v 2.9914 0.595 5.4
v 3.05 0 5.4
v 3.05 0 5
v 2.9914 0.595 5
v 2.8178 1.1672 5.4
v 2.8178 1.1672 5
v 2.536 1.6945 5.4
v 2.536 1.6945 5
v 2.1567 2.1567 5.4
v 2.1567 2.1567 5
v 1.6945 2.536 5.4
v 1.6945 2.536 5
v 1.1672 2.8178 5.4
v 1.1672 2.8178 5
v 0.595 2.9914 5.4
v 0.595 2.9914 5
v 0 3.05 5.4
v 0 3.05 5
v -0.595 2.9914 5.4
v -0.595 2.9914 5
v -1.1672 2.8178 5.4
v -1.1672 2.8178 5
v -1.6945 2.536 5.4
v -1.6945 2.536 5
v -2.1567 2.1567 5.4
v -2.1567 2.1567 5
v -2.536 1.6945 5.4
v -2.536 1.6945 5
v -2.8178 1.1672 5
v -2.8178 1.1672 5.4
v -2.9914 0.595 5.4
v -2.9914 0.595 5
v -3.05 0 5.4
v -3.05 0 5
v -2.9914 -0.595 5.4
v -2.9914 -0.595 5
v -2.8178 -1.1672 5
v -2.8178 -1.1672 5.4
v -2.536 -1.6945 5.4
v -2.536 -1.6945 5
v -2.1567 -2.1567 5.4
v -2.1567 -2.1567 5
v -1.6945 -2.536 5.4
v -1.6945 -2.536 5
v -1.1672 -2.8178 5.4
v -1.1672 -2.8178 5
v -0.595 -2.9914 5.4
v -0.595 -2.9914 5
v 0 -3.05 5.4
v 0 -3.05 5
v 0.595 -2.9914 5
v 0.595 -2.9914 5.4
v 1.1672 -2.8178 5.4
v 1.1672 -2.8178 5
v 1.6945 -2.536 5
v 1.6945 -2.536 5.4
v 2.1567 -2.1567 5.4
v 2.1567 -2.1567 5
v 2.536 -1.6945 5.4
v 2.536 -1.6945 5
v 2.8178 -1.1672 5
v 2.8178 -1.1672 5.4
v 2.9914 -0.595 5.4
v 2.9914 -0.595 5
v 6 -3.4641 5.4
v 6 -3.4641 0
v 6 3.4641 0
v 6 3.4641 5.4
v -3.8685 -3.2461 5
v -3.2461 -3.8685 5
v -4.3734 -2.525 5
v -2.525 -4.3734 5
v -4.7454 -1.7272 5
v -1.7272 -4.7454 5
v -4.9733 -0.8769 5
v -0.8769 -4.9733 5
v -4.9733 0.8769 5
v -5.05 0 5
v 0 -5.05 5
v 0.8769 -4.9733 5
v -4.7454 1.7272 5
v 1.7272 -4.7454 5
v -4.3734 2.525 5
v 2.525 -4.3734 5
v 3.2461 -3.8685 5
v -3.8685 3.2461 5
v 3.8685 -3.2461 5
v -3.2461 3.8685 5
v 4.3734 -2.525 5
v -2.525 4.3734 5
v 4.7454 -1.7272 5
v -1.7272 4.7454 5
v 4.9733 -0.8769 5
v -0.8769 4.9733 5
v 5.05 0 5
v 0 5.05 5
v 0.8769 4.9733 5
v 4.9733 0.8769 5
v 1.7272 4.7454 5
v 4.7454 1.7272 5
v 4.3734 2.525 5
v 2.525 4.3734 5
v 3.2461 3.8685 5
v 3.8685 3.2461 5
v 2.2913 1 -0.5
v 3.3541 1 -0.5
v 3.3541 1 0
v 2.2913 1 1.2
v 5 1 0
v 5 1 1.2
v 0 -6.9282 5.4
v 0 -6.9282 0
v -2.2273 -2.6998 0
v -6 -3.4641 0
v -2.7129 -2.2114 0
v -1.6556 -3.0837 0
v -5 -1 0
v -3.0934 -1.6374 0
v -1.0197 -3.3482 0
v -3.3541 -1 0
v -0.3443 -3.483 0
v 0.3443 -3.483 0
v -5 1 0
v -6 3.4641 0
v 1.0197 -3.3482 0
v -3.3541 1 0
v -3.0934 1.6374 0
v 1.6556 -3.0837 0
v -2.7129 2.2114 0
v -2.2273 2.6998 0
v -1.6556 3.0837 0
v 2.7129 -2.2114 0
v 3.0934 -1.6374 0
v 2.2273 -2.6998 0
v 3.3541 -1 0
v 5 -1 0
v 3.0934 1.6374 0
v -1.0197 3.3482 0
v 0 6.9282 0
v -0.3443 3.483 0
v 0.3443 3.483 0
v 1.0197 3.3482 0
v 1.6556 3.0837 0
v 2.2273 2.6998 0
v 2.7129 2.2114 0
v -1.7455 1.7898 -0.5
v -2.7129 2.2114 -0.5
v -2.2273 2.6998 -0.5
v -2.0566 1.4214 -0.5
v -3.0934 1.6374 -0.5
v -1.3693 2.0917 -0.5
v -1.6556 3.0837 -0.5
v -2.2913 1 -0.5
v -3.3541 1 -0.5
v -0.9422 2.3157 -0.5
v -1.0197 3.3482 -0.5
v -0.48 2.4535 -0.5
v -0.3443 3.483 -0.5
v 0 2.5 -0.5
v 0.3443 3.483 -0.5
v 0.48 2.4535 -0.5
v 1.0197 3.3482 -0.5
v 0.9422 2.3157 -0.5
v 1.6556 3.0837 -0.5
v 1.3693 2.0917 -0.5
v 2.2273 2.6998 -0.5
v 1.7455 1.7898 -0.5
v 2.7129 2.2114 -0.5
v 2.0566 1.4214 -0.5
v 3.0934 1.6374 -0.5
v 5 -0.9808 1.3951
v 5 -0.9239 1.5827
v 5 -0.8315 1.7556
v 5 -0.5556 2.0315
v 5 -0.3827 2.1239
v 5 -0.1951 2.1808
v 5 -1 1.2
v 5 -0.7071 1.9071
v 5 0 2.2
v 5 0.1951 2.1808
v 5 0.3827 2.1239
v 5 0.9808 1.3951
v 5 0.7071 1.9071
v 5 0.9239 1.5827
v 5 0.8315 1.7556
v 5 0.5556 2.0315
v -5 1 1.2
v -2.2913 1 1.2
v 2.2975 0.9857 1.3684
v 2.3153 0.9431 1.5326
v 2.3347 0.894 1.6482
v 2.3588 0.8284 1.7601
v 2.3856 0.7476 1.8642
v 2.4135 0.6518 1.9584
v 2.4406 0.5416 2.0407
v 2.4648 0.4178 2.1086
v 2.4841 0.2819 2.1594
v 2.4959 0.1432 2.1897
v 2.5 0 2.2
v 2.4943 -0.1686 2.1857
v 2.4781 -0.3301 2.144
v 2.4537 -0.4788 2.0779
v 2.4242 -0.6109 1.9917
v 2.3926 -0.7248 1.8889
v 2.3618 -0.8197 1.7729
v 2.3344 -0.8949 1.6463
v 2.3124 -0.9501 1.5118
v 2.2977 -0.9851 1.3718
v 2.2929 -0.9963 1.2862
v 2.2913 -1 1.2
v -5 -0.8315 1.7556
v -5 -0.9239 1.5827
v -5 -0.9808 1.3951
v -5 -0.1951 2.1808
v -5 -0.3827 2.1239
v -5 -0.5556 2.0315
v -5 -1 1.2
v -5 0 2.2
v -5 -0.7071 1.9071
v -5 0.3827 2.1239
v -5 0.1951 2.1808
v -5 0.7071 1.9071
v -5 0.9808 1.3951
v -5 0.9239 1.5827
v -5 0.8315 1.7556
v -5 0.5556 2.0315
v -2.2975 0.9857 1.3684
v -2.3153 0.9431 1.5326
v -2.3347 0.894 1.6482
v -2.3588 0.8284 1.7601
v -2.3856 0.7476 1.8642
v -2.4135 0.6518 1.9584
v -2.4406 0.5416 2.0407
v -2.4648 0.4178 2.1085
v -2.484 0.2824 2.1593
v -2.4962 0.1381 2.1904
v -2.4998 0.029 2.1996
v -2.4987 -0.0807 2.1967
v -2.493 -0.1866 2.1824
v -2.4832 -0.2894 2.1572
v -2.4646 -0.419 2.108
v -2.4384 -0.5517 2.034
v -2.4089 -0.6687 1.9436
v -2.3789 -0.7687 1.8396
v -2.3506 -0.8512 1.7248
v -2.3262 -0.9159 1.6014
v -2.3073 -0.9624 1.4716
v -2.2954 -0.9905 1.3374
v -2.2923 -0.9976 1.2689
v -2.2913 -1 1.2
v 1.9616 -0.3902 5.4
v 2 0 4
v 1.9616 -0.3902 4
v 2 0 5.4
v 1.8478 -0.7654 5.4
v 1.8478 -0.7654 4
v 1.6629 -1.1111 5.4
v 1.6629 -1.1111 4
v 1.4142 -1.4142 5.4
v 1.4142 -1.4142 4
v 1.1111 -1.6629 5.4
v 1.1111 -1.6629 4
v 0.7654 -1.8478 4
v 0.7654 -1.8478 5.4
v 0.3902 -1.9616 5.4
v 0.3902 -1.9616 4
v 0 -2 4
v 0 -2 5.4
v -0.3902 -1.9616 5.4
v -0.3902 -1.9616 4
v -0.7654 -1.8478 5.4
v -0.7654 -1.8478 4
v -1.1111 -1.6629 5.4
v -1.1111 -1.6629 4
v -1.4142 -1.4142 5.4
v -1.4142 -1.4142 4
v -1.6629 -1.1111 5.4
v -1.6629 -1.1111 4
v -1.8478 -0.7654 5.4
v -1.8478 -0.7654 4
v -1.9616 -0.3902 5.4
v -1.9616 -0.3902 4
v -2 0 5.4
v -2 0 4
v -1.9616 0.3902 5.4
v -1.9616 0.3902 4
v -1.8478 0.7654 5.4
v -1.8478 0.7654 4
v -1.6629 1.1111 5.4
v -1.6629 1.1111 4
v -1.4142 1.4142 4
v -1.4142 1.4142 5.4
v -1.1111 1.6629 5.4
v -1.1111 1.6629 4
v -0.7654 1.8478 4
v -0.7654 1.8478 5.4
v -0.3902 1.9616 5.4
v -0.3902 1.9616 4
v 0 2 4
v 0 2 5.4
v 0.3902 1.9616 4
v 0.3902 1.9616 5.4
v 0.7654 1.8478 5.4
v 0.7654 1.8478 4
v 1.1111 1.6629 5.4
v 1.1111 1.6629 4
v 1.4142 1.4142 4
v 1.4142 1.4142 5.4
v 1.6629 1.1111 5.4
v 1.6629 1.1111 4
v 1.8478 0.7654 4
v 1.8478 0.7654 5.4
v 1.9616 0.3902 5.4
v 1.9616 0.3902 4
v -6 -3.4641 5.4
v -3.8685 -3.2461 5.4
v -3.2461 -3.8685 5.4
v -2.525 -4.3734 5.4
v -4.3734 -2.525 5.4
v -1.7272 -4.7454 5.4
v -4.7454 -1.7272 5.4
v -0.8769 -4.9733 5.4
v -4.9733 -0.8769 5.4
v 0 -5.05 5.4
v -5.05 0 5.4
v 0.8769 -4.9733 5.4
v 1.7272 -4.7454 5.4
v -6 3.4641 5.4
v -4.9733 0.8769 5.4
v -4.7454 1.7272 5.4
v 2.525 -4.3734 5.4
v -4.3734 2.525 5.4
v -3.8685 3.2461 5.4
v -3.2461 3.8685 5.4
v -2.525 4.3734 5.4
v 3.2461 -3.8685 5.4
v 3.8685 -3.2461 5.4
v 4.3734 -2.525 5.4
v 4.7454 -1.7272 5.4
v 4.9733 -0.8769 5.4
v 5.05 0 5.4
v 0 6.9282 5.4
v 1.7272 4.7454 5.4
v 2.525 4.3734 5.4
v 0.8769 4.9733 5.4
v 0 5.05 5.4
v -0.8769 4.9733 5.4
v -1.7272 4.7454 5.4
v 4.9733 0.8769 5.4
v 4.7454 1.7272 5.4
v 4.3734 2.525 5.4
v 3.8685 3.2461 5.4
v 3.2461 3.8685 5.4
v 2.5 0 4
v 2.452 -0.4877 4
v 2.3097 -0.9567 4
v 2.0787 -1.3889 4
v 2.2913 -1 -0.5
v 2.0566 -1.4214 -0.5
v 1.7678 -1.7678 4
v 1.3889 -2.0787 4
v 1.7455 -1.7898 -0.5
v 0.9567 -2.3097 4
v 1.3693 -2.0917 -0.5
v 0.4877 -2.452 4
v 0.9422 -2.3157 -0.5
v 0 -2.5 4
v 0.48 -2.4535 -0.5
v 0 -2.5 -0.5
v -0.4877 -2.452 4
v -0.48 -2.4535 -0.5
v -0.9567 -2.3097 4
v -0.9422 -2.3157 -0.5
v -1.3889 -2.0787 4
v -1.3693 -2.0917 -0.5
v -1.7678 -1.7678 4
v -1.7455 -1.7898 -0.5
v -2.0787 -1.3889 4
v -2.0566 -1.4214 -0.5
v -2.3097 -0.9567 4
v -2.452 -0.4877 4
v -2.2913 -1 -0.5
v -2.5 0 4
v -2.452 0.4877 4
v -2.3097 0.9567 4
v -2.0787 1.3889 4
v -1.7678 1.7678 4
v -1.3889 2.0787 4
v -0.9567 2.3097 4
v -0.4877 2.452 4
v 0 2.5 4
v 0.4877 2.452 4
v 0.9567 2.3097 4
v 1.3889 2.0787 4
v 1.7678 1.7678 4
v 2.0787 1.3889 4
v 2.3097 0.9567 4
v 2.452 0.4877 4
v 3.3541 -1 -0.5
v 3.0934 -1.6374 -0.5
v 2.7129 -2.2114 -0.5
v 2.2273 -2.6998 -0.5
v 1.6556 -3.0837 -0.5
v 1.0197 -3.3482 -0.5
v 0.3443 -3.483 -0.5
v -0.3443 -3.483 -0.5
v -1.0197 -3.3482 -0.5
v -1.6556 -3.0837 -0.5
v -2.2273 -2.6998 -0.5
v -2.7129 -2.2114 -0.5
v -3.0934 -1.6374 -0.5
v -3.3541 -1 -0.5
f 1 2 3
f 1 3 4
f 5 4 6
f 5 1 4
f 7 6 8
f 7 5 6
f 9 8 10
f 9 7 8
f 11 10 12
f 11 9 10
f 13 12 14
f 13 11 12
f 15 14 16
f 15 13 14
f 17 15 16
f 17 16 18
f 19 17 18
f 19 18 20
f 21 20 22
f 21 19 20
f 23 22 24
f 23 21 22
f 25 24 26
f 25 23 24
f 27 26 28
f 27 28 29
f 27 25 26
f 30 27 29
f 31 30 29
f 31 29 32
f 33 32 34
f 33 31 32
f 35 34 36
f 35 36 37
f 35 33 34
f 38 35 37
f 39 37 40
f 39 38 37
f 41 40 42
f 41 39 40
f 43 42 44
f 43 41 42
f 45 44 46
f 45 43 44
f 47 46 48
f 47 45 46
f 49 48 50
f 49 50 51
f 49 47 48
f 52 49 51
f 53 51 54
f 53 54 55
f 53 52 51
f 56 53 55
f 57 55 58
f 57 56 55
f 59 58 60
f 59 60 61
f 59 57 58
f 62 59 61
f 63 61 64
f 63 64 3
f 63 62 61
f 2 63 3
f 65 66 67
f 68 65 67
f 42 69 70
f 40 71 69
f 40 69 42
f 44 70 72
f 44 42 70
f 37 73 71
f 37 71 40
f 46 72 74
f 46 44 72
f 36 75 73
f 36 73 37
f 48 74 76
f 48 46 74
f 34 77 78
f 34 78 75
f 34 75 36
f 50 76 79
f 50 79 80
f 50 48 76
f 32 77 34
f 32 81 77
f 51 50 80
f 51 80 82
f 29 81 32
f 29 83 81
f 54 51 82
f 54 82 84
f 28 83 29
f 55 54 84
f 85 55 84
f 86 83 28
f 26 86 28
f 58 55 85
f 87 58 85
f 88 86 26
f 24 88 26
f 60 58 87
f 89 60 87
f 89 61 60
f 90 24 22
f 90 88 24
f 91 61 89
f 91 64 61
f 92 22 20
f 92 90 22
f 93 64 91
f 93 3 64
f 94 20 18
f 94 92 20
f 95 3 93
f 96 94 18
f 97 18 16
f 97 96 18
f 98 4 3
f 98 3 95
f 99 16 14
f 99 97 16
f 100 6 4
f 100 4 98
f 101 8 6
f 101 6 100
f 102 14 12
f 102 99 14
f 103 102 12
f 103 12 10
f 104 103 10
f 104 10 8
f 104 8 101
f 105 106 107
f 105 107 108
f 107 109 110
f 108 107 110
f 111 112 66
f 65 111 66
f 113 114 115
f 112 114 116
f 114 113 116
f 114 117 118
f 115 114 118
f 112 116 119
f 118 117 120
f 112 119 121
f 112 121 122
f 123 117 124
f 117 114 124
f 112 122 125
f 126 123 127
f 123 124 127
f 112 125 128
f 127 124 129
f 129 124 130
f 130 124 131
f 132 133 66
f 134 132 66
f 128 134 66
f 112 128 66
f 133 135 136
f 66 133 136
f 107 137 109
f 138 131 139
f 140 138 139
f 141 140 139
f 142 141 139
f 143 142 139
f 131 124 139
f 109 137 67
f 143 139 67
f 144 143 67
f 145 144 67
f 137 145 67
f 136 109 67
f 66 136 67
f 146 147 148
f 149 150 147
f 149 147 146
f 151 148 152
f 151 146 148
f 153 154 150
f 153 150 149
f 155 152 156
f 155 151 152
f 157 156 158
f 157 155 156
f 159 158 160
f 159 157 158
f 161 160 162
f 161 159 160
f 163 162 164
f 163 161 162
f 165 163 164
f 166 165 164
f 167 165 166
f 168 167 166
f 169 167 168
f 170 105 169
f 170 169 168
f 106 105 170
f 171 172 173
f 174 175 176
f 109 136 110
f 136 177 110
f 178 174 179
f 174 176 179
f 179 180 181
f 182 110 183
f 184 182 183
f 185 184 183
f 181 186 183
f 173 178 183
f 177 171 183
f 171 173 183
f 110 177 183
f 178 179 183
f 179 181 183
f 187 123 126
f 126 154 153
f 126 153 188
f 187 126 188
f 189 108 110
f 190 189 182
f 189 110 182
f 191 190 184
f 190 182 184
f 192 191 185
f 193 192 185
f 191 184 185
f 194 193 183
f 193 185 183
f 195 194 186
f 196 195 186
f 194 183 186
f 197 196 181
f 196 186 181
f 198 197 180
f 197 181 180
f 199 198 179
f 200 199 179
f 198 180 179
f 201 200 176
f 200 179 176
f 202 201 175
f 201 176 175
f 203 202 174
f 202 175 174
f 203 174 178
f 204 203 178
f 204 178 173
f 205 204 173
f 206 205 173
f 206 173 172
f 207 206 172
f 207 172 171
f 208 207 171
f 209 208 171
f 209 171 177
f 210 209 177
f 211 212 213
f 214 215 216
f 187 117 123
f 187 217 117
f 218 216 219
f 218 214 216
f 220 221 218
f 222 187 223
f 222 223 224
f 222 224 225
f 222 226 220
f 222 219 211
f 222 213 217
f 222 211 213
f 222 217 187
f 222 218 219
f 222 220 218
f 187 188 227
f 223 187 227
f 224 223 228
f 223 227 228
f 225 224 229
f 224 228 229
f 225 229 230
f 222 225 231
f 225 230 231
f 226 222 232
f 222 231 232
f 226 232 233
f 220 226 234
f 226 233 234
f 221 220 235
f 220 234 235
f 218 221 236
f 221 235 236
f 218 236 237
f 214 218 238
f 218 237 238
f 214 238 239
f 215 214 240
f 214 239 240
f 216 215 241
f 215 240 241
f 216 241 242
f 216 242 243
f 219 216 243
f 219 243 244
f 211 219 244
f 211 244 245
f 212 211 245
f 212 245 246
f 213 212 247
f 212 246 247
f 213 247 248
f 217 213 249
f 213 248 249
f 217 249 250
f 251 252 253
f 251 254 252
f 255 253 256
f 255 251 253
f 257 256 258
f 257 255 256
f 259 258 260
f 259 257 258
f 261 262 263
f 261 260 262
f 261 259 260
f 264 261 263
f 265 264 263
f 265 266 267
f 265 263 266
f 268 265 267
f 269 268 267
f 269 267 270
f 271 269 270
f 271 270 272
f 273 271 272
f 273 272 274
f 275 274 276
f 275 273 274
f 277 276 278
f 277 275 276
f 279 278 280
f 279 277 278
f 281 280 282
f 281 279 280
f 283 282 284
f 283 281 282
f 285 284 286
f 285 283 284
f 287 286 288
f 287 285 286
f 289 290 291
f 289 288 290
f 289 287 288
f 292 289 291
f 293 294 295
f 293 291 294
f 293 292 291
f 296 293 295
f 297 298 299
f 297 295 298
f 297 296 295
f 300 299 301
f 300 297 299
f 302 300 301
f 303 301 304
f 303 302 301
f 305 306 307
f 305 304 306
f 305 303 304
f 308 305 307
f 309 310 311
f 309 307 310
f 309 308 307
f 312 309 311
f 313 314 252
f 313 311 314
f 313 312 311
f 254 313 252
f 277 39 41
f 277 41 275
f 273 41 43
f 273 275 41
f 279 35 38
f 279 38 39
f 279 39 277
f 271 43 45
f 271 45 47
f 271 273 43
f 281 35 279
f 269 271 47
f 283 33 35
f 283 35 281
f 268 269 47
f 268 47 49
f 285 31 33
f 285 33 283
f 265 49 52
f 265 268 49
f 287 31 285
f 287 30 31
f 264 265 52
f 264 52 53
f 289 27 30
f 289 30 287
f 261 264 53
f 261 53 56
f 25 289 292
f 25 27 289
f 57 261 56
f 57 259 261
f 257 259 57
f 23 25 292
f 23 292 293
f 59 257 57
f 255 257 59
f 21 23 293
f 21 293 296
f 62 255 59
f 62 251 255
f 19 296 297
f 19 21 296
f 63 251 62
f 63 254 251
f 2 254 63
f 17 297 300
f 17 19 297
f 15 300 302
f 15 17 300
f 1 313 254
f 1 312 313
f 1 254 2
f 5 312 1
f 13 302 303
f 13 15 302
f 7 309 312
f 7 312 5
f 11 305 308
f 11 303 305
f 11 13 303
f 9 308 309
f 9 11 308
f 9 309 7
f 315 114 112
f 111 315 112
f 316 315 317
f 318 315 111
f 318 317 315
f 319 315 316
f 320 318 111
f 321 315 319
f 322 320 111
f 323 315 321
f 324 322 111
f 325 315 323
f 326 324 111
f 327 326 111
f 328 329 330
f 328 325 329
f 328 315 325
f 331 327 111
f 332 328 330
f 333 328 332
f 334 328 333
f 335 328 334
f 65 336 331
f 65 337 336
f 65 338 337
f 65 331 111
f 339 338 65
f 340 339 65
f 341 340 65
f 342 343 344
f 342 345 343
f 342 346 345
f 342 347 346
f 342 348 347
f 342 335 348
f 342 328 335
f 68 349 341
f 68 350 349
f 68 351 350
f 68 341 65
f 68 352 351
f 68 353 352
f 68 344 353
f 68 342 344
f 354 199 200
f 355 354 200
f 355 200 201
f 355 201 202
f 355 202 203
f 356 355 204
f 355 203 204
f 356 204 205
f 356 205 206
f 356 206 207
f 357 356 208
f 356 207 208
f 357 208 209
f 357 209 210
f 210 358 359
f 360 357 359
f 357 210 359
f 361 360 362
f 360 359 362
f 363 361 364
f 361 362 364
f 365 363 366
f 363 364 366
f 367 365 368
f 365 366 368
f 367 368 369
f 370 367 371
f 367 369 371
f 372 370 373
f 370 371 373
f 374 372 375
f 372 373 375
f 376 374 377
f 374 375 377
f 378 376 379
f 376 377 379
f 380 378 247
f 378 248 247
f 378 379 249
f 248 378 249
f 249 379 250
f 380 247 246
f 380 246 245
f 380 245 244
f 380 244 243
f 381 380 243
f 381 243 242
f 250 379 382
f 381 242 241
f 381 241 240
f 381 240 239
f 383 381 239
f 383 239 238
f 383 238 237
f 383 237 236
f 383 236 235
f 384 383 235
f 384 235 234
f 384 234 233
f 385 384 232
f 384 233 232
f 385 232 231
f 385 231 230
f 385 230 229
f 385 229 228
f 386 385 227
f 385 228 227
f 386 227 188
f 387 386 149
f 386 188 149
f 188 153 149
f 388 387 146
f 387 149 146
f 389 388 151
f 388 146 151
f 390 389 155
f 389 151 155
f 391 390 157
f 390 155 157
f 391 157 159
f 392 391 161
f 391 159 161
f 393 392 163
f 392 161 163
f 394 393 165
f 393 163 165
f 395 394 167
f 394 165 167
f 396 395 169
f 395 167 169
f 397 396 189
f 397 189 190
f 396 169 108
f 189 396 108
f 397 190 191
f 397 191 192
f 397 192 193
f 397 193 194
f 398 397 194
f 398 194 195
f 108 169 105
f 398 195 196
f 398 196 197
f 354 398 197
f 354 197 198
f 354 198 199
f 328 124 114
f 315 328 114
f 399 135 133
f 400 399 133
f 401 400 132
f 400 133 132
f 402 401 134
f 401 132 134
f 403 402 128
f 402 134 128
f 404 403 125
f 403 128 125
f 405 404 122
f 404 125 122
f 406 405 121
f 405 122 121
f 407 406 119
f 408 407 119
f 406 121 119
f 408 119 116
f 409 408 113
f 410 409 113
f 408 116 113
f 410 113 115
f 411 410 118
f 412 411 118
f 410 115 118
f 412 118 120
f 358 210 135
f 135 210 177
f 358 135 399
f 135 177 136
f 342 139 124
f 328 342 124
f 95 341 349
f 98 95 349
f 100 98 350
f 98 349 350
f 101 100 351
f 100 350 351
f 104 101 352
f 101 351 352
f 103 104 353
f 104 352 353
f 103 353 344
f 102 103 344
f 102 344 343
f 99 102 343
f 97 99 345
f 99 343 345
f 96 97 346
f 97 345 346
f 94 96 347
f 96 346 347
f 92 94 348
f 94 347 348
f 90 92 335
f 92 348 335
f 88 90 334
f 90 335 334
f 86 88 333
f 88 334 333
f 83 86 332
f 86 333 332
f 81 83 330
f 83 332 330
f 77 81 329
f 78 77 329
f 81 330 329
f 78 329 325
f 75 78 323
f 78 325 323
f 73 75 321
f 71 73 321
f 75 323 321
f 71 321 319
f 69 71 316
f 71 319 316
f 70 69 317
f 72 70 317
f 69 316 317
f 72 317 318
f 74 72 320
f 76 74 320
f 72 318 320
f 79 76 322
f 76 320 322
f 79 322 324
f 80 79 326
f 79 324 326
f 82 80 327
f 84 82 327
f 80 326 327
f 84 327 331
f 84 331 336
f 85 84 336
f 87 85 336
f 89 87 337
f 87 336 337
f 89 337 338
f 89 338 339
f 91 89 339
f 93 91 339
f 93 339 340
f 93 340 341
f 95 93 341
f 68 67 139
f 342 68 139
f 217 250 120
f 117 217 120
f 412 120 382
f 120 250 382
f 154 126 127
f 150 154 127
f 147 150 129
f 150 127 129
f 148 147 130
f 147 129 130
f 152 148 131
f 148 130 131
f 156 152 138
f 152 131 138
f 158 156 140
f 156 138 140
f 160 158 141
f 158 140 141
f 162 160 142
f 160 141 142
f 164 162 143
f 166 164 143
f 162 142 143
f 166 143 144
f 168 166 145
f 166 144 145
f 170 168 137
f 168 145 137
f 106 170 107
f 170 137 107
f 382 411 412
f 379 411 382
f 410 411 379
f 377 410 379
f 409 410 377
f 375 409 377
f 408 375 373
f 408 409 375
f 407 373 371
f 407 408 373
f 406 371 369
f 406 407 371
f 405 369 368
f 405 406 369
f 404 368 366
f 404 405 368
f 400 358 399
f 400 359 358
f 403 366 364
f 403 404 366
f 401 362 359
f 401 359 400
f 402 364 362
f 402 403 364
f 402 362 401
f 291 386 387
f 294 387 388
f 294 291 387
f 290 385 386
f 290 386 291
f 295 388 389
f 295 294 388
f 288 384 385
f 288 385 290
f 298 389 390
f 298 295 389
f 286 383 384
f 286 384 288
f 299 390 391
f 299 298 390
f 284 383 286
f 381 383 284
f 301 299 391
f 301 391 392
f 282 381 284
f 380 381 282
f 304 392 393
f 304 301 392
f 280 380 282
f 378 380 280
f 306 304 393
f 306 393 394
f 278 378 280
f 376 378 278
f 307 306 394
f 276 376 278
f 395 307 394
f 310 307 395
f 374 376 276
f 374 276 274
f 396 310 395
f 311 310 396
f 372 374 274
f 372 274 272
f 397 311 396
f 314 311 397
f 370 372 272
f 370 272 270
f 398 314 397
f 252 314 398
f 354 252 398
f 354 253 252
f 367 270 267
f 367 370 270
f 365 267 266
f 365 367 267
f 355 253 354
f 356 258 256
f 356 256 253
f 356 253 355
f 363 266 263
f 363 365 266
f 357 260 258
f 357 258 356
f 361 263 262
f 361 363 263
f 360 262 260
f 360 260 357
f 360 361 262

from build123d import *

# Parameters (mm, degrees)
F1_DEPTH  = 5.4
F2_R      = 5.05
F2_R_2    = 3.05
F3_DEPTH  = 0.4
F4_R      = 2
F5_DEPTH  = 5.401
F6_R      = 3.5
F6_R_2    = 2
F7_DEPTH  = 0.5
F8_R      = 2.5
F9_DEPTH  = 4.5
F11_DEPTH = 5


with BuildPart() as f1:
    # F0 (on Top) → F1 (new body)
    with BuildSketch(Plane.XY):
        Polygon((6, -3.4641016151), (6, 3.4641016151), (0, 6.9282032303), (-6, 3.4641016151), (-6, -3.4641016151), (0, -6.9282032303), align=None)
    extrude(amount=F1_DEPTH)

    # F2 (on face) → F3 (cut)
    with BuildSketch(Plane.XY.offset(5.4)):
        Circle(F2_R)
        Circle(F2_R_2, mode=Mode.SUBTRACT)
    extrude(amount=-F3_DEPTH, mode=Mode.SUBTRACT)

    # F4 (on face) → F5 (cut, through all)
    with BuildSketch(Plane.XY.offset(5.4)):
        Circle(F4_R)
    extrude(amount=-F5_DEPTH, mode=Mode.SUBTRACT)

    # F6 (on face) → F7 (join)
    with BuildSketch(Plane(origin=(0, 0, 0), x_dir=(1, 0, 0), z_dir=(0, 0, -1))):
        Circle(F6_R)
        Circle(F6_R_2, mode=Mode.SUBTRACT)
    extrude(amount=F7_DEPTH)

    # F8 (on face) → F9 (cut)
    with BuildSketch(Plane(origin=(0, 0, -0.5), x_dir=(1, 0, 0), z_dir=(0, 0, -1))):
        Circle(F8_R)
    extrude(amount=-F9_DEPTH, mode=Mode.SUBTRACT)

    # F10 (on Right) → F11 (cut, symmetric)
    with BuildSketch(Plane.YZ):
        with BuildLine():
            Line((1, -1.5), (1, 1.2))
            ThreePointArc((1, 1.2), (0, 2.2), (-1, 1.2))
            Line((-1, 1.2), (-1, -1.5))
            Line((-1, -1.5), (1, -1.5))
        make_face()
    extrude(amount=F11_DEPTH, both=True, mode=Mode.SUBTRACT)


solid = f1.part
